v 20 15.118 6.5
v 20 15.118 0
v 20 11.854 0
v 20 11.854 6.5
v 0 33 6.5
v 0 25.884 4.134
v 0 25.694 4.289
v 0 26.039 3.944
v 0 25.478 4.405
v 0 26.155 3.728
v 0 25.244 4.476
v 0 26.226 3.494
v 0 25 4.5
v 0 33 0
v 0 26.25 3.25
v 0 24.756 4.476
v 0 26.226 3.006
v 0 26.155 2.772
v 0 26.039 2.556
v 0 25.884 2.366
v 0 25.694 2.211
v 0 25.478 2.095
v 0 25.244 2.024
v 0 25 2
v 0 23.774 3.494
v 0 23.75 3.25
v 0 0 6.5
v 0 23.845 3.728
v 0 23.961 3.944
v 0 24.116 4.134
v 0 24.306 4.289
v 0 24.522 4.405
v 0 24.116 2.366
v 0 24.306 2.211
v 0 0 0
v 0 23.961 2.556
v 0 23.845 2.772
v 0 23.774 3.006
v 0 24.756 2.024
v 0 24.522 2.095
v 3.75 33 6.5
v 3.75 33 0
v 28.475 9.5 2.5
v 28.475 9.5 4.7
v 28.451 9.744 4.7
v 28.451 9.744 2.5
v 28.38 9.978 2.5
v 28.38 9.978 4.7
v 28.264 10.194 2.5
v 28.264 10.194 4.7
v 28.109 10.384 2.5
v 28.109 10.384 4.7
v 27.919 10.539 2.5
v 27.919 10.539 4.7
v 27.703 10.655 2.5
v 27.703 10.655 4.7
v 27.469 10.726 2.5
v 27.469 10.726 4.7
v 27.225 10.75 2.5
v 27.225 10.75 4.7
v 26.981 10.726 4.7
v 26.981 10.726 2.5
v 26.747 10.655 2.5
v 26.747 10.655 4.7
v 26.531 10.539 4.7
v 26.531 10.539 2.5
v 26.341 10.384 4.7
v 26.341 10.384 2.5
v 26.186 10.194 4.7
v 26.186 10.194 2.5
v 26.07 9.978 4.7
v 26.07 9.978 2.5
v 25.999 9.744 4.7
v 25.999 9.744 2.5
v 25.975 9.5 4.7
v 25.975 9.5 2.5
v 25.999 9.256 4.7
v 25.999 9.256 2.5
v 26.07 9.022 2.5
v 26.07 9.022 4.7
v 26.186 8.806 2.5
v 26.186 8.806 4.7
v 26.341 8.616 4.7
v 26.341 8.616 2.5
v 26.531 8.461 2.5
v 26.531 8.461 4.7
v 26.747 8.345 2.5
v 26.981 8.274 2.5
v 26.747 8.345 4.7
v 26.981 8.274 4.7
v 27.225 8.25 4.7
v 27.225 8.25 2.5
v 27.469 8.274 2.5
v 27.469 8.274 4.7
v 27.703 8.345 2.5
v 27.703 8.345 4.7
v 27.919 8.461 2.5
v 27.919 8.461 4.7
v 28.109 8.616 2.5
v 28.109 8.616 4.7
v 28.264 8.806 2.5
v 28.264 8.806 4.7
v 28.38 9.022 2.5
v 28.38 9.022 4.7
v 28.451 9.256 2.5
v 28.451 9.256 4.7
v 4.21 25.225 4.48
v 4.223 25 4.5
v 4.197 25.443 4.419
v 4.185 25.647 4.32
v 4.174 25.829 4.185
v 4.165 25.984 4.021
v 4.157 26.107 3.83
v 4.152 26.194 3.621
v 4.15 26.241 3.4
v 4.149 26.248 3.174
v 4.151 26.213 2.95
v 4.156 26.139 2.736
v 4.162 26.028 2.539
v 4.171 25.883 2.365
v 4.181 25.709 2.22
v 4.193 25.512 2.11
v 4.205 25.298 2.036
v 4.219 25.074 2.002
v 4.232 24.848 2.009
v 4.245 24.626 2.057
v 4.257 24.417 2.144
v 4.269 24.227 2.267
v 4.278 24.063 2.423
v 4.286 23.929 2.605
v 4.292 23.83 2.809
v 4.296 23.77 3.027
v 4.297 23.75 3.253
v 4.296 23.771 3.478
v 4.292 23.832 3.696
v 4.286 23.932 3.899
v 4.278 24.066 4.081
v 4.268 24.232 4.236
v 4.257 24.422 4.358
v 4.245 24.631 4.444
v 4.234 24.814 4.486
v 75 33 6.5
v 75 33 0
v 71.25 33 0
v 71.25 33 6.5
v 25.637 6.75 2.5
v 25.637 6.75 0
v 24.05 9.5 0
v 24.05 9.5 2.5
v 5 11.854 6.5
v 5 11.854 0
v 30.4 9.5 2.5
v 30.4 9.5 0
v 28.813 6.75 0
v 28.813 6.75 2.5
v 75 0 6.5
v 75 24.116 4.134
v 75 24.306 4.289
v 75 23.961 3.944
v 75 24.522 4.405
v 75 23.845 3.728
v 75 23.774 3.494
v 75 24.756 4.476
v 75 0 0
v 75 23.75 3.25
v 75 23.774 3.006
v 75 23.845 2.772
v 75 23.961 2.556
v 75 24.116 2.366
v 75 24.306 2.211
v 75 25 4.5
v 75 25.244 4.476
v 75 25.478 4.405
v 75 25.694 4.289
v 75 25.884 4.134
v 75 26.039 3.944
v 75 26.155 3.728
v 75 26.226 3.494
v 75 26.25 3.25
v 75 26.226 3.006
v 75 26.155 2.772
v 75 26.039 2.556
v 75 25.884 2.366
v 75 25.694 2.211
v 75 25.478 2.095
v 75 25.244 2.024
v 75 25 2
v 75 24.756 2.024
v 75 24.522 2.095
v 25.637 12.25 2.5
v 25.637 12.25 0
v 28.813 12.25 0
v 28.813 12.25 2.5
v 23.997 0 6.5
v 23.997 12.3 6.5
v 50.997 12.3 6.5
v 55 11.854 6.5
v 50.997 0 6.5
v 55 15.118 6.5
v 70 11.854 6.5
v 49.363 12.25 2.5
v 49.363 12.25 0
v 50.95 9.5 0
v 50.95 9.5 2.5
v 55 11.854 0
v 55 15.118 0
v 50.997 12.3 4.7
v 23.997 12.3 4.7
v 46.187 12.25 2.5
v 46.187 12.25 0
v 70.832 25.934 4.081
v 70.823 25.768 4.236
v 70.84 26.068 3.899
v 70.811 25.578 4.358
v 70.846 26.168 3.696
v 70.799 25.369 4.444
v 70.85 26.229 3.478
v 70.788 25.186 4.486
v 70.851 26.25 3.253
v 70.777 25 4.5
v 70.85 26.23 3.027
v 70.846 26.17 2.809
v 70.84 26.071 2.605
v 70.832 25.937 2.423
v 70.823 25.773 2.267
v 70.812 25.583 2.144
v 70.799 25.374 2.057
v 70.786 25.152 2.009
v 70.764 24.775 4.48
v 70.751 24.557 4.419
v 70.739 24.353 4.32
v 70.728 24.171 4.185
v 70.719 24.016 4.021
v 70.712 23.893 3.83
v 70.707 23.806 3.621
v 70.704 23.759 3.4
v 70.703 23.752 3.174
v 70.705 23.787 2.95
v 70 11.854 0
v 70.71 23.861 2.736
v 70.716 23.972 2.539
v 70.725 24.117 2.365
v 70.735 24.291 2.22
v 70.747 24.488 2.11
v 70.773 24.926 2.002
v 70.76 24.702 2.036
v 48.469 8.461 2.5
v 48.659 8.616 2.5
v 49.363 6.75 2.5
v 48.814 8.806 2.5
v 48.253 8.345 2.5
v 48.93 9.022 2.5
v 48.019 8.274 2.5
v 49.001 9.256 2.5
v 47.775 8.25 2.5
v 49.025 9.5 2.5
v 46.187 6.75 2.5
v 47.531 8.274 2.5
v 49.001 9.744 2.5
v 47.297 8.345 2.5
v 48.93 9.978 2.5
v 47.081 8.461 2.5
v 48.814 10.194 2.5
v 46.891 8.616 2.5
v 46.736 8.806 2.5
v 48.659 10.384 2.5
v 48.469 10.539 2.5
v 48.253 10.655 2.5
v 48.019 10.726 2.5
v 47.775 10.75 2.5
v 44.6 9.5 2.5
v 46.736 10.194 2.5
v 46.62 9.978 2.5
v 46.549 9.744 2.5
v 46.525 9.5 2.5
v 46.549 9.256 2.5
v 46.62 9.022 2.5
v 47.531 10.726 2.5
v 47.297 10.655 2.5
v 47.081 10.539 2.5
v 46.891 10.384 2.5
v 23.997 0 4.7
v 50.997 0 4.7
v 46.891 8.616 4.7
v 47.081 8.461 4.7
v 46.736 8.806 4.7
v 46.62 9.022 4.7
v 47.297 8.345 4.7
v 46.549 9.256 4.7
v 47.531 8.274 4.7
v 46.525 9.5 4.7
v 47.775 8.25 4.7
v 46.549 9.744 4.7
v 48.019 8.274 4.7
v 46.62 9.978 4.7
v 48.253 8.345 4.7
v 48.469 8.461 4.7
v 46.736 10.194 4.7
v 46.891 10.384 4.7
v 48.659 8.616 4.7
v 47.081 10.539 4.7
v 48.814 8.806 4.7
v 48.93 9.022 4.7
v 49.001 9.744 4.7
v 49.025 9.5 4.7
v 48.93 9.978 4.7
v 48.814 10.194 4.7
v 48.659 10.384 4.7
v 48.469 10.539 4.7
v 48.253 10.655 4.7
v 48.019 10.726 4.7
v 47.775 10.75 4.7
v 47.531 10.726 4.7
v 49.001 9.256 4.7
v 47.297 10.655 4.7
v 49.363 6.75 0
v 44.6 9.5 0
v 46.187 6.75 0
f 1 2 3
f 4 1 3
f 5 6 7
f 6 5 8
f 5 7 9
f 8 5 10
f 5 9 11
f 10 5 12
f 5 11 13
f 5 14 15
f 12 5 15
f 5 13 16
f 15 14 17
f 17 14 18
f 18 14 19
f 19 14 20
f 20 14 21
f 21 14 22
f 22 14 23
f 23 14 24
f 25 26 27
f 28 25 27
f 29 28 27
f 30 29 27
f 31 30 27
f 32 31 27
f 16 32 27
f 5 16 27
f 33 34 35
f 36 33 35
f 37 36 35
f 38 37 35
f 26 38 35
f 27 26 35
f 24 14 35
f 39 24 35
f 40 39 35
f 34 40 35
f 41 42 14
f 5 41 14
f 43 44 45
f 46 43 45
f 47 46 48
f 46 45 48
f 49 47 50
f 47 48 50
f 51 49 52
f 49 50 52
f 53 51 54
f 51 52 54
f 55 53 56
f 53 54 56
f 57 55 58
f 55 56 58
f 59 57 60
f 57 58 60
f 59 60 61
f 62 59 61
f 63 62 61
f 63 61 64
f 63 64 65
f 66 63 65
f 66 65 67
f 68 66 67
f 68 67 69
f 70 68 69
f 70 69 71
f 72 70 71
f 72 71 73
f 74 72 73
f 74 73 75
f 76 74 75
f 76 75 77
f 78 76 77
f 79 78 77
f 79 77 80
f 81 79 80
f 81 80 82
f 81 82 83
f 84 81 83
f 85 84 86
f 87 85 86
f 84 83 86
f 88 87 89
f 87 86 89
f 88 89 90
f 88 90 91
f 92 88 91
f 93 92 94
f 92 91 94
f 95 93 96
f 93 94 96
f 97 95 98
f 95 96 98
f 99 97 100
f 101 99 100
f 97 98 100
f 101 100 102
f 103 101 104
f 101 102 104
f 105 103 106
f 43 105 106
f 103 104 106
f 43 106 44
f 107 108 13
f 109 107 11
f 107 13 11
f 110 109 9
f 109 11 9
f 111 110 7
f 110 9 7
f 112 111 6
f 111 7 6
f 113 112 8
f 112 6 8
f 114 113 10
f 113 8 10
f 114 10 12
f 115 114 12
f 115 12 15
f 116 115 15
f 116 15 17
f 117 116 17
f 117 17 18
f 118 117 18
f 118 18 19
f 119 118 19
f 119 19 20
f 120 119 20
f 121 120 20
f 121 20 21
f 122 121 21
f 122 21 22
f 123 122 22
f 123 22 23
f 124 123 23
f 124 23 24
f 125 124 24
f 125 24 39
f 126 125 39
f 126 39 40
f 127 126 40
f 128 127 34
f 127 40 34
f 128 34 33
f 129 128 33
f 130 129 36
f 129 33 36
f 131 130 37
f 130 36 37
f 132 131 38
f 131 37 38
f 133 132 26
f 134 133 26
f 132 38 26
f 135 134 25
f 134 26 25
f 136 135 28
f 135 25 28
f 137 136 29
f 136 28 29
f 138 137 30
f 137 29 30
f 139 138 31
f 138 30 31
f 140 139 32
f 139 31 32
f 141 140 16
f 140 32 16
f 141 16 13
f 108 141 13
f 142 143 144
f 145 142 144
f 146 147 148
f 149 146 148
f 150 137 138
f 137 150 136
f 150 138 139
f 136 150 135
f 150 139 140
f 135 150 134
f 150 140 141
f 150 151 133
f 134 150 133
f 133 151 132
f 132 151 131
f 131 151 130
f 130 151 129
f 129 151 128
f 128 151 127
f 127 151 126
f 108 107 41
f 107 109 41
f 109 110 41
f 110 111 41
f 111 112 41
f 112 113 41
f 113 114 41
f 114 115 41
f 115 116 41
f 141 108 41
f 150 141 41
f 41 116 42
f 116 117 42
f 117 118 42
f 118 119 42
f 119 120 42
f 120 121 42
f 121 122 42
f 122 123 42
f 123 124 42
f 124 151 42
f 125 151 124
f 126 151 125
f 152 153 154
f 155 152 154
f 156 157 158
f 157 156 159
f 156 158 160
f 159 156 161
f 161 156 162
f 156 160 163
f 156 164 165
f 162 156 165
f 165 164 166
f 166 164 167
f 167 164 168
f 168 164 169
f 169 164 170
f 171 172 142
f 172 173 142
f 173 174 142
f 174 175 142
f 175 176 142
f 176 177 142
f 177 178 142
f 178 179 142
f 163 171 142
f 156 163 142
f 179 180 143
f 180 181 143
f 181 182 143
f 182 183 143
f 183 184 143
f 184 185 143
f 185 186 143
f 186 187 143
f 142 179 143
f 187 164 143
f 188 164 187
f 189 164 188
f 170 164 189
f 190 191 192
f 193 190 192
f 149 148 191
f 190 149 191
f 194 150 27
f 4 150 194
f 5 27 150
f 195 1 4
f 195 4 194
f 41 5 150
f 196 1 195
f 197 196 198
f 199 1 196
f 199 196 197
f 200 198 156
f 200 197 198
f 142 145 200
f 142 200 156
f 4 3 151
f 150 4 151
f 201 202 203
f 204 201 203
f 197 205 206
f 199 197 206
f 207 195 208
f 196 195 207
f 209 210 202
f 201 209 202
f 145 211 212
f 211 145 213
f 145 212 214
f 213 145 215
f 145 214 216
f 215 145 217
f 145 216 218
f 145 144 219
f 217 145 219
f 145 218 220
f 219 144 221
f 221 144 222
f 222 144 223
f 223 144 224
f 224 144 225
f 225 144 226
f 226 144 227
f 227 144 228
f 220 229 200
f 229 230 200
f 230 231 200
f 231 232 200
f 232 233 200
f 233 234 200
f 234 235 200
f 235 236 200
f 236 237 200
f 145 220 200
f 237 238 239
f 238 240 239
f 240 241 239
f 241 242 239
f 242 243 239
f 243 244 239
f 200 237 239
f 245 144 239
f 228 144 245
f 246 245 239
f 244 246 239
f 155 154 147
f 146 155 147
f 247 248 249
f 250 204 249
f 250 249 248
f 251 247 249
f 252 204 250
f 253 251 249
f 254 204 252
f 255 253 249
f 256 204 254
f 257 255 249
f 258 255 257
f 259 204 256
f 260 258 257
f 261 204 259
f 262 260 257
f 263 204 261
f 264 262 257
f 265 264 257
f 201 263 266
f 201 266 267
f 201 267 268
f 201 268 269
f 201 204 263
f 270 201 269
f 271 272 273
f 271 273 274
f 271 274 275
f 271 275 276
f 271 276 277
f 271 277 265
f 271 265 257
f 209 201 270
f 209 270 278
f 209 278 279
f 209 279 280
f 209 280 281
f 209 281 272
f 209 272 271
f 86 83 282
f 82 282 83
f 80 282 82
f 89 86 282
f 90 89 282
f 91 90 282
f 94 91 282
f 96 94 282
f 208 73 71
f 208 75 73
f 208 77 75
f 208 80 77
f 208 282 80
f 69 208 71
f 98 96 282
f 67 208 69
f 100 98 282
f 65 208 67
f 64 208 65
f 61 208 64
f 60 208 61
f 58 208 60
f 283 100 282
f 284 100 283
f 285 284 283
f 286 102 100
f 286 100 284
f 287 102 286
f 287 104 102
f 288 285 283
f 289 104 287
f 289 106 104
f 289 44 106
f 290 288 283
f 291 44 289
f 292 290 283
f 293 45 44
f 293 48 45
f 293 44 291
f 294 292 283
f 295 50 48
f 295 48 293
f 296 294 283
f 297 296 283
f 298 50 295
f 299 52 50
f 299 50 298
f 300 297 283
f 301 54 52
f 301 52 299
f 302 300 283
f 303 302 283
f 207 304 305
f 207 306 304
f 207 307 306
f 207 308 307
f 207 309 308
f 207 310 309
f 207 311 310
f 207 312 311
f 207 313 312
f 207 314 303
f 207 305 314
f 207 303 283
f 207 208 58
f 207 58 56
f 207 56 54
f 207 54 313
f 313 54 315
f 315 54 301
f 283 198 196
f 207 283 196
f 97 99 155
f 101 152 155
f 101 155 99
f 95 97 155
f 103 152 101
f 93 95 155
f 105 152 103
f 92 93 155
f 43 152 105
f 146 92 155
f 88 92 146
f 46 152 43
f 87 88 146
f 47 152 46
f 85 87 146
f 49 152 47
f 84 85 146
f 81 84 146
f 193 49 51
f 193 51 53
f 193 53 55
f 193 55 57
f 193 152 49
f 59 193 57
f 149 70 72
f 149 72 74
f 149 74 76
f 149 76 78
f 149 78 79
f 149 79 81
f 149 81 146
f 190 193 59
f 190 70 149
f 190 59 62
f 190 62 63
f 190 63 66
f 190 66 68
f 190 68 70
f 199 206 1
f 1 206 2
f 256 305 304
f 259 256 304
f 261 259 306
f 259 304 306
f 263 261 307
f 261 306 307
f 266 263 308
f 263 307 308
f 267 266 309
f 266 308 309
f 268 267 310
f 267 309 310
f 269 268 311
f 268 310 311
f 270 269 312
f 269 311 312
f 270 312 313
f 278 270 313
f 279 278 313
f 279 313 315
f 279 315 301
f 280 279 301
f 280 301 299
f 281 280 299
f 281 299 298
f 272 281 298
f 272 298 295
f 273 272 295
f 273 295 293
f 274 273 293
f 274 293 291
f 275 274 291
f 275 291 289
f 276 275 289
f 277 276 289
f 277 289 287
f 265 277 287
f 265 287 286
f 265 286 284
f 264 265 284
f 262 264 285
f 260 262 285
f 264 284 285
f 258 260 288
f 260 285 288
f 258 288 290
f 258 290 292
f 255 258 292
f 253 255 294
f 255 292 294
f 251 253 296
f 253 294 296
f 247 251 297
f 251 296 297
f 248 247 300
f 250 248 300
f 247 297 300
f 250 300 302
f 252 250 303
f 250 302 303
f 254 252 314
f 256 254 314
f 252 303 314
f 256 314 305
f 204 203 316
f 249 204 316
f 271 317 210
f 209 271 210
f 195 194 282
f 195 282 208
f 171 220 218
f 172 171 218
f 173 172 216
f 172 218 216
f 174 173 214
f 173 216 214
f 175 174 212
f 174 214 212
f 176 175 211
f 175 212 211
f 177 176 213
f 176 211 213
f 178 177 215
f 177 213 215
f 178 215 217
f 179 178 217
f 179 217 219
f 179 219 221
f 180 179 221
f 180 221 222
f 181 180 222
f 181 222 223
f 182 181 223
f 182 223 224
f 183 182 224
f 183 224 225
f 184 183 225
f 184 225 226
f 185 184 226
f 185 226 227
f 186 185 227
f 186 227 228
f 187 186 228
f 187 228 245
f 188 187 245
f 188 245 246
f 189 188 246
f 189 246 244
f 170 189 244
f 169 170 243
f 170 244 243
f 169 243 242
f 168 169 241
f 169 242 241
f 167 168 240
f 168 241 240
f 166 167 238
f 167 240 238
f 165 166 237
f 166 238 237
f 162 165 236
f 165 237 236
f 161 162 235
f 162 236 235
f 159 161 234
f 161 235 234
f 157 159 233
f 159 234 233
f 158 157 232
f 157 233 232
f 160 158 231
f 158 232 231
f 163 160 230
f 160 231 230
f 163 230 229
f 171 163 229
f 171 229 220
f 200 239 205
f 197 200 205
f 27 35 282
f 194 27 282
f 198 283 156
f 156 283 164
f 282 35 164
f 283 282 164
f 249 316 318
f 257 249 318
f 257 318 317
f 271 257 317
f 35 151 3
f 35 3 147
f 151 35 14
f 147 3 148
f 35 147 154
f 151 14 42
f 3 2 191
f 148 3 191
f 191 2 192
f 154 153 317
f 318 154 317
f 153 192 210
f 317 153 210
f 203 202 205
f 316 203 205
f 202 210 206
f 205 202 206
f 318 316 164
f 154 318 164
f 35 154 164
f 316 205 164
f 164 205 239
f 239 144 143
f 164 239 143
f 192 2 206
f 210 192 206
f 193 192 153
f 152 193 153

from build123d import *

# Parameters (mm, degrees)
ESTRUSIONE_ESTRUSIONE1_DEPTH = 6.5
TAGLIO_ESTRUSIONE2_DEPTH     = 2.5
SCHIZZO2_R                   = 1.25
TAGLIO_ESTRUSIONE3_DEPTH     = 7.5
SCHIZZO4_W                   = 27
SCHIZZO4_H                   = 12.3
TAGLIO_ESTRUSIONE4_DEPTH     = 1.8
SCHIZZO6_R                   = 1.25
TAGLIO_ESTRUSIONE5_DEPTH     = 76


with BuildPart() as part:
    # Schizzo1 → Estrusione-Estrusione1 (new body)
    with BuildSketch(Plane.XY):
        Polygon((0, 0), (75, 0), (75, 33), (71.25, 33), (70, 11.85394892), (55, 11.85394892), (55, 15.118104456), (20, 15.118104456), (20, 11.85394892), (5, 11.85394892), (3.75, 33), (0, 33), align=None)
    extrude(amount=ESTRUSIONE_ESTRUSIONE1_DEPTH)

    # Schizzo3 → Taglio-Estrusione2 (cut)
    with BuildSketch(Plane(origin=(0, 0, 0), x_dir=(-1, 0, 0), z_dir=(0, 0, -1))):
        Polygon((-44.599573519, 9.5), (-46.18728676, 12.25), (-49.36271324, 12.25), (-50.950426481, 9.5), (-49.36271324, 6.75), (-46.18728676, 6.75), align=None)
        Polygon((-24.049573519, 9.5), (-25.63728676, 12.25), (-28.81271324, 12.25), (-30.400426481, 9.5), (-28.81271324, 6.75), (-25.63728676, 6.75), align=None)
    extrude(amount=-TAGLIO_ESTRUSIONE2_DEPTH, mode=Mode.SUBTRACT)

    # Schizzo2 → Taglio-Estrusione3 (cut, through all)
    with BuildSketch(Plane.XY.offset(6.5)):
        with Locations((27.225, 9.5)):
            Circle(SCHIZZO2_R)
        with Locations((47.775, 9.5)):
            Circle(SCHIZZO2_R)
    extrude(amount=-TAGLIO_ESTRUSIONE3_DEPTH, mode=Mode.SUBTRACT)

    # Schizzo4 → Taglio-Estrusione4 (cut)
    with BuildSketch(Plane.XY.offset(6.5)):
        with Locations((37.496683744, 6.15)):
            Rectangle(SCHIZZO4_W, SCHIZZO4_H)
    extrude(amount=-TAGLIO_ESTRUSIONE4_DEPTH, mode=Mode.SUBTRACT)

    # Schizzo6 → Taglio-Estrusione5 (cut, through all)
    with BuildSketch(Plane.ZY):
        with Locations((3.25, 25)):
            Circle(SCHIZZO6_R)
    extrude(amount=-TAGLIO_ESTRUSIONE5_DEPTH, mode=Mode.SUBTRACT)


solid = part.part
